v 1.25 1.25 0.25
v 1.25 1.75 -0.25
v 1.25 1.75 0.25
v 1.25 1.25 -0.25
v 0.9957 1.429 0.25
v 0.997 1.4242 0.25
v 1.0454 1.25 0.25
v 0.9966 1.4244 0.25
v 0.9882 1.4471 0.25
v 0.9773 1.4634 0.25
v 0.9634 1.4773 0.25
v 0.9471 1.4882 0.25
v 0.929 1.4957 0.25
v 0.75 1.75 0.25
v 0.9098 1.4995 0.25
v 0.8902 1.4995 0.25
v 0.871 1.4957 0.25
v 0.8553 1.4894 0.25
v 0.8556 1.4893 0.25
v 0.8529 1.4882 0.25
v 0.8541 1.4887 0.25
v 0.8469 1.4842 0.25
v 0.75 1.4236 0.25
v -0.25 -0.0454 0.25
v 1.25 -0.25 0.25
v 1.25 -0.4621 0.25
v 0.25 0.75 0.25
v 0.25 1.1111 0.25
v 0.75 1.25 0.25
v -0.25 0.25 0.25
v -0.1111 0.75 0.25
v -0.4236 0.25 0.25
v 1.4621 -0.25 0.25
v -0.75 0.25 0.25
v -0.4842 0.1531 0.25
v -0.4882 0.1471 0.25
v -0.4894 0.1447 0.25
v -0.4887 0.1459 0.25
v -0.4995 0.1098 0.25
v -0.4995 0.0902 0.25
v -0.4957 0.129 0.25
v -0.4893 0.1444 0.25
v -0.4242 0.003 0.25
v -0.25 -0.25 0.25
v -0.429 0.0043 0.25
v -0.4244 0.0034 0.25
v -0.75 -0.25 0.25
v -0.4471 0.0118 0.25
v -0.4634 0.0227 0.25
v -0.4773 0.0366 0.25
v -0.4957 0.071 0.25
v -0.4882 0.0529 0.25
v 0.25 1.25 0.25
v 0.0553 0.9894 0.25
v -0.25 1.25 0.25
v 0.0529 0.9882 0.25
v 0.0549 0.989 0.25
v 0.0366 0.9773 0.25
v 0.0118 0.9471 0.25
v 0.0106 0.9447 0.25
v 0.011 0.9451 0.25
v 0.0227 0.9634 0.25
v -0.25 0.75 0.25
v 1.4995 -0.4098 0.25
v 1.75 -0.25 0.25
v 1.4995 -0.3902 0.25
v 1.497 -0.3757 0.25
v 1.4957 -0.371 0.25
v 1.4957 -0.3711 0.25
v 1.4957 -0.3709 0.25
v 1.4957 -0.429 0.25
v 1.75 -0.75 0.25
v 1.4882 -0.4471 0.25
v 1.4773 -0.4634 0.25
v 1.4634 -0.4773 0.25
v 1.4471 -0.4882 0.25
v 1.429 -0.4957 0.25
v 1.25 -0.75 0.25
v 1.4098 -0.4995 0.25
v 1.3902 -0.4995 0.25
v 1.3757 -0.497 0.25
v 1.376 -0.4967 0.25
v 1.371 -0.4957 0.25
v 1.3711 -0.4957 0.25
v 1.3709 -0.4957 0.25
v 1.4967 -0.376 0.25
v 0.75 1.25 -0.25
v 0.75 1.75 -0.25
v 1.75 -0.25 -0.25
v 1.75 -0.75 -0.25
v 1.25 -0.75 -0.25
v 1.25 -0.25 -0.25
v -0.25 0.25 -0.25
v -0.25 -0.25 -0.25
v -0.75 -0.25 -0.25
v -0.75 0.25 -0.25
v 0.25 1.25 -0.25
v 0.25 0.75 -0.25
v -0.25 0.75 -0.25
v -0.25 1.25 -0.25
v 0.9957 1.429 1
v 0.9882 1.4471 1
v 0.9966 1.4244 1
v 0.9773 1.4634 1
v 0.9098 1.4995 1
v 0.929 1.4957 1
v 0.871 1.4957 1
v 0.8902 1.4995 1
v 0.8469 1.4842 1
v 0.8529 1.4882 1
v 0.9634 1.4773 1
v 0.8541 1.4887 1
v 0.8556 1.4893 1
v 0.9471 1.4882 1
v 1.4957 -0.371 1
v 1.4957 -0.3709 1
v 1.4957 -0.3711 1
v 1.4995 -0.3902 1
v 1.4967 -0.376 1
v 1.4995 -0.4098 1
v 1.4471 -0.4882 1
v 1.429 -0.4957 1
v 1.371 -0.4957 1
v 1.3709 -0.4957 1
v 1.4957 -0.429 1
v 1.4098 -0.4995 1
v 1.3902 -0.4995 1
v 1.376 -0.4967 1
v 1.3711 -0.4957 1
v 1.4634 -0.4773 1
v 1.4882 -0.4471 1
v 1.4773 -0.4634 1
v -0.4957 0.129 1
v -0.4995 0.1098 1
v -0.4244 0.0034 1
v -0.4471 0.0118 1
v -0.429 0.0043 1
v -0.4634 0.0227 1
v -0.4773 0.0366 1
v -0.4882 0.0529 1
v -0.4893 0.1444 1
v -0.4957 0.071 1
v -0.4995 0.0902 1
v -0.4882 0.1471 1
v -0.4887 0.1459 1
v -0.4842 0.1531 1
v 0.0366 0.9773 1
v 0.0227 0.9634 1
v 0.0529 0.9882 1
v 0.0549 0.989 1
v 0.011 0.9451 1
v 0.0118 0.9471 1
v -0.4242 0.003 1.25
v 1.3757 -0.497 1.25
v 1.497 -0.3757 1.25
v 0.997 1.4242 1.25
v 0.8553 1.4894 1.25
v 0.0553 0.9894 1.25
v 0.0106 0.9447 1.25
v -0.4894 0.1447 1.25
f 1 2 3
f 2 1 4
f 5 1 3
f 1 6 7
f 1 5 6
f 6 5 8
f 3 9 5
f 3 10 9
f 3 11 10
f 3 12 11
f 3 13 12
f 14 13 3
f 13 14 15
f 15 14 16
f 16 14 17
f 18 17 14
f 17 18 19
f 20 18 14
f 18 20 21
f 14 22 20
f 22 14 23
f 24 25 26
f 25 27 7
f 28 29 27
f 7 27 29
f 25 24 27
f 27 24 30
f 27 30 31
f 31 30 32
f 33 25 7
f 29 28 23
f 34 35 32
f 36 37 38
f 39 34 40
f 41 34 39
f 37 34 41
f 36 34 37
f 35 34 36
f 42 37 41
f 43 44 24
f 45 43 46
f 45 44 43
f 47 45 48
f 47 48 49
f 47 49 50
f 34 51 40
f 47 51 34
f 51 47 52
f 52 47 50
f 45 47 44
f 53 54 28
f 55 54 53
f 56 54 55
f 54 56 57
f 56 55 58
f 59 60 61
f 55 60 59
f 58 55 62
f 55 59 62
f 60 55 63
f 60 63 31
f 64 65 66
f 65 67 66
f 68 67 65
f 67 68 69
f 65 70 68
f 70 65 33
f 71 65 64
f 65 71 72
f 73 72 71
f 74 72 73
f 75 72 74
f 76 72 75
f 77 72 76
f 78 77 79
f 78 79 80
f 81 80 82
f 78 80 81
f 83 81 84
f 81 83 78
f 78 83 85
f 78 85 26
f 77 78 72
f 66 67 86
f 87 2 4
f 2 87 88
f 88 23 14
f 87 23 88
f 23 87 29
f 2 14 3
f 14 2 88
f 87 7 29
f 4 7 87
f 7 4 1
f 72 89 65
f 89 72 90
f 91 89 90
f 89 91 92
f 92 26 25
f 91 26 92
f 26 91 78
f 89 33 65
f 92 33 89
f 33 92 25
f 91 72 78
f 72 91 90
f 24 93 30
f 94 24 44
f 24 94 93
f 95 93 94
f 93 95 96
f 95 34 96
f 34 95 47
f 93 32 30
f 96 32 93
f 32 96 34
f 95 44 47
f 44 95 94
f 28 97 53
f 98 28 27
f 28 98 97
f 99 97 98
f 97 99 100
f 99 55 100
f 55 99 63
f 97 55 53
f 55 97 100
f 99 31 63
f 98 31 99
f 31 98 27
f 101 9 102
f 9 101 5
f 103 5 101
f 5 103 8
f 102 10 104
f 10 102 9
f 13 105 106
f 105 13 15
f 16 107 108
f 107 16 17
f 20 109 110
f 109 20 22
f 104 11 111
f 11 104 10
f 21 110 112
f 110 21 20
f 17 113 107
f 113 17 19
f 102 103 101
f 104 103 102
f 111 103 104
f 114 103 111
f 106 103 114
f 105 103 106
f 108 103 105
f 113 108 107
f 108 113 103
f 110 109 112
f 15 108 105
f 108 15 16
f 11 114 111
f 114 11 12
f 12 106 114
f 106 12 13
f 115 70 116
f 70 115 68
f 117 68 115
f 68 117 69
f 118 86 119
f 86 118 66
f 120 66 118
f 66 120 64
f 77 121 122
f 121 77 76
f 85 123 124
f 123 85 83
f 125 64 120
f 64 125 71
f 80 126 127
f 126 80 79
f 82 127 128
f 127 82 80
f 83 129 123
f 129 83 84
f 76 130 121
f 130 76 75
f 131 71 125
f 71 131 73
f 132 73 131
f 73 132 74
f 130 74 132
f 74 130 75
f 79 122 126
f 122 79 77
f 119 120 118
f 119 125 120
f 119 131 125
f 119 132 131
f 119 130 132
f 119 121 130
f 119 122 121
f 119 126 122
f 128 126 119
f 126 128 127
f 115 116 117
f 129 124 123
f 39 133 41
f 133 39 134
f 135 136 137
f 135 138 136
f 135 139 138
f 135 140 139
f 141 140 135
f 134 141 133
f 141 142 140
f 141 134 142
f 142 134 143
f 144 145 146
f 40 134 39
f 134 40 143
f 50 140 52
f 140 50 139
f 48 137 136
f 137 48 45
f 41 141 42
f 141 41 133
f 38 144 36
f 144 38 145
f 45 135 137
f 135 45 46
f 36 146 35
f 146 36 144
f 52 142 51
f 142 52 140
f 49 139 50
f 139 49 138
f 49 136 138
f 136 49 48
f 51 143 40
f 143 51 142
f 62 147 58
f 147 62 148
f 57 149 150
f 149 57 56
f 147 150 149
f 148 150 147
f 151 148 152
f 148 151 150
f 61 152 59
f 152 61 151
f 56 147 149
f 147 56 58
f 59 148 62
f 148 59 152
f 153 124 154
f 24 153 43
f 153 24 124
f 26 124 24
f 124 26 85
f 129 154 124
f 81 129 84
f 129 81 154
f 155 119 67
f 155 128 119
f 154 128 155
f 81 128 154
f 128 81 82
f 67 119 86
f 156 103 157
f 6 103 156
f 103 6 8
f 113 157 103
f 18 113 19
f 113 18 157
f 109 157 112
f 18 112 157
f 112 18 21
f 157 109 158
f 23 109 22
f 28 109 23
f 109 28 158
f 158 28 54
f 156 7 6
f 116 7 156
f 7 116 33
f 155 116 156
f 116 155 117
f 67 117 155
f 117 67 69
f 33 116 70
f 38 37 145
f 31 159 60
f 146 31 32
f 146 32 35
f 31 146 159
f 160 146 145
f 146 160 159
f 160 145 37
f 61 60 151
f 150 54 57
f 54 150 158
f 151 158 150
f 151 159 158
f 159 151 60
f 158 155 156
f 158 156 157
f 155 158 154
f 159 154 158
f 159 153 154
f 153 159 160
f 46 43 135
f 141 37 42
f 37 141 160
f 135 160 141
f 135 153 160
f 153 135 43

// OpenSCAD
// use $fn % 4 = 0;
module cube_fillet(lwh=[1,1,1], r=0.1, edge_scales=[1,2,2,1], edge_offsets=[0,0,0,0], $fn=32, center=true) {
    $fn = ceil($fn / 4) * 4;
    
    corner_rotation = 180 / $fn;
    fudge = 1/cos(180/$fn);
    fr = r;// * fudge;
    
    center_translation = center ? [0,0,0] : [lwh[0] * 0.5, lwh[1] * 0.5, lwh[2] * 0.5, ];
    
    half_lwh = [lwh[0] * 0.5, lwh[1] * 0.5, lwh[2] * 0.5];
    half_edge_offsets = [edge_offsets[0] * 0.5, edge_offsets[1] * 0.5, edge_offsets[2] * 0.5, edge_offsets[3] * 0.5];
    
    cornerNE = [
        half_lwh[0] * edge_scales[0] + half_edge_offsets[0],
        half_lwh[1] * edge_scales[1] + half_edge_offsets[1],
        -half_lwh[2]
    ];
    cornerSE = [
        (half_lwh[0] * edge_scales[2] + half_edge_offsets[2]),
        -(half_lwh[1] * edge_scales[1] + half_edge_offsets[1]),
        -half_lwh[2]
    ];
    
    cornerSW = [
        -(half_lwh[0] * edge_scales[2] + half_edge_offsets[2]),
        -(half_lwh[1] * edge_scales[3] + half_edge_offsets[3]),
        -half_lwh[2]
    ];
    
    cornerNW = [
        -(half_lwh[0] * edge_scales[0] + half_edge_offsets[0]),
        (half_lwh[1] * edge_scales[3] + half_edge_offsets[3]),
        -half_lwh[2]
    ];
    
    corner_angles = [
        atan2(cornerSE[1] - cornerNE[1], cornerSE[0] - cornerNE[0]),
        atan2(cornerSW[1] - cornerSE[1], cornerSW[0] - cornerSE[0]),
        atan2(cornerNW[1] - cornerSW[1], cornerNW[0] - cornerSW[0]),
        atan2(cornerNE[1] - cornerNW[1], cornerNE[0] - cornerNW[0])
    ];
    
    box_points = [
        [cornerNE[0] - r - r * cos(corner_angles[3] - 90), cornerNE[1] - r - r * sin(corner_angles[3] - 90)],
        [cornerNE[0] - r - r * cos(corner_angles[0] - 90), cornerNE[1] - r - r * sin(corner_angles[0] - 90)],
        
        [cornerSE[0] - r - r * cos(corner_angles[0] - 90), cornerSE[1] + r - r * sin(corner_angles[0] - 90)],
        [cornerSE[0] - r - r * cos(corner_angles[1] - 90), cornerSE[1] + r - r * sin(corner_angles[1] - 90)],
        
        [cornerSW[0] + r - r * cos(corner_angles[1] - 90), cornerSW[1] + r - r * sin(corner_angles[1] - 90)],
        [cornerSW[0] + r - r * cos(corner_angles[2] - 90), cornerSW[1] + r - r * sin(corner_angles[2] - 90)],
        
        [cornerNW[0] + r - r * cos(corner_angles[2] - 90), cornerNW[1] - r - r * sin(corner_angles[2] - 90)],
        [cornerNW[0] + r - r * cos(corner_angles[3] - 90), cornerNW[1] - r - r * sin(corner_angles[3] - 90)],
    ];
    
    box_paths = [[ 0,1,2,3,4,5,6,7]];
    
    translate(center_translation){
        translate([cornerNE[0], cornerNE[1], cornerNE[2]]){
            cube([0.5,0.5,0.5], true);
        }
        translate([cornerSE[0], cornerSE[1], cornerSE[2]]){
            cube([0.5,0.5,0.5], true);
        }
        translate([cornerSW[0], cornerSW[1], cornerSW[2]]){
            cube([0.5,0.5,0.5], true);
        }
        translate([cornerNW[0], cornerNW[1], cornerNW[2]]){
            cube([0.5,0.5,0.5], true);
        }
        
       // union(){
            //corners
            //NE
            
            translate([cornerNE[0] - r, cornerNE[1] - r, cornerNE[2]]){
                // orient cylinder edges to match box
                rotate([0,0,corner_rotation]){
                    cylinder(h=lwh[2], r=fr, $fn=$fn);
                }
            }
            //SE
            translate([cornerSE[0] - r, cornerSE[1] + r, cornerSE[2]]){ 
                
                rotate([0,0,corner_rotation]){
                    cylinder(h=lwh[2], r=fr, $fn=$fn);
                }
            }
            //SW
            translate([cornerSW[0] + r, cornerSW[1] + r, cornerSW[2]]){ 
                
                rotate([0,0,corner_rotation]){
                    cylinder(h=lwh[2], r=fr, $fn=$fn);
                }
            }
            //NE
            translate([cornerNW[0] + r, cornerNW[1] - r, cornerNW[2]]){ 
                rotate([0,0,corner_rotation]){
                    cylinder(h=lwh[2], r=fr, $fn=$fn);
                }
            }
            
            translate([0,0,-0.25 * lwh[2]]){ 
                linear_extrude(height=lwh[2]){
                    polygon(paths = box_paths, points = box_points);
                }
            }
            
            // boxes
            //cube([lwh[0] - 2*r, lwh[1], lwh[2]], true);
            //cube([lwh[0], lwh[1] - 2*r, lwh[2]], true);
       // }
    }
};

cube_fillet($fn=32, center=false);
